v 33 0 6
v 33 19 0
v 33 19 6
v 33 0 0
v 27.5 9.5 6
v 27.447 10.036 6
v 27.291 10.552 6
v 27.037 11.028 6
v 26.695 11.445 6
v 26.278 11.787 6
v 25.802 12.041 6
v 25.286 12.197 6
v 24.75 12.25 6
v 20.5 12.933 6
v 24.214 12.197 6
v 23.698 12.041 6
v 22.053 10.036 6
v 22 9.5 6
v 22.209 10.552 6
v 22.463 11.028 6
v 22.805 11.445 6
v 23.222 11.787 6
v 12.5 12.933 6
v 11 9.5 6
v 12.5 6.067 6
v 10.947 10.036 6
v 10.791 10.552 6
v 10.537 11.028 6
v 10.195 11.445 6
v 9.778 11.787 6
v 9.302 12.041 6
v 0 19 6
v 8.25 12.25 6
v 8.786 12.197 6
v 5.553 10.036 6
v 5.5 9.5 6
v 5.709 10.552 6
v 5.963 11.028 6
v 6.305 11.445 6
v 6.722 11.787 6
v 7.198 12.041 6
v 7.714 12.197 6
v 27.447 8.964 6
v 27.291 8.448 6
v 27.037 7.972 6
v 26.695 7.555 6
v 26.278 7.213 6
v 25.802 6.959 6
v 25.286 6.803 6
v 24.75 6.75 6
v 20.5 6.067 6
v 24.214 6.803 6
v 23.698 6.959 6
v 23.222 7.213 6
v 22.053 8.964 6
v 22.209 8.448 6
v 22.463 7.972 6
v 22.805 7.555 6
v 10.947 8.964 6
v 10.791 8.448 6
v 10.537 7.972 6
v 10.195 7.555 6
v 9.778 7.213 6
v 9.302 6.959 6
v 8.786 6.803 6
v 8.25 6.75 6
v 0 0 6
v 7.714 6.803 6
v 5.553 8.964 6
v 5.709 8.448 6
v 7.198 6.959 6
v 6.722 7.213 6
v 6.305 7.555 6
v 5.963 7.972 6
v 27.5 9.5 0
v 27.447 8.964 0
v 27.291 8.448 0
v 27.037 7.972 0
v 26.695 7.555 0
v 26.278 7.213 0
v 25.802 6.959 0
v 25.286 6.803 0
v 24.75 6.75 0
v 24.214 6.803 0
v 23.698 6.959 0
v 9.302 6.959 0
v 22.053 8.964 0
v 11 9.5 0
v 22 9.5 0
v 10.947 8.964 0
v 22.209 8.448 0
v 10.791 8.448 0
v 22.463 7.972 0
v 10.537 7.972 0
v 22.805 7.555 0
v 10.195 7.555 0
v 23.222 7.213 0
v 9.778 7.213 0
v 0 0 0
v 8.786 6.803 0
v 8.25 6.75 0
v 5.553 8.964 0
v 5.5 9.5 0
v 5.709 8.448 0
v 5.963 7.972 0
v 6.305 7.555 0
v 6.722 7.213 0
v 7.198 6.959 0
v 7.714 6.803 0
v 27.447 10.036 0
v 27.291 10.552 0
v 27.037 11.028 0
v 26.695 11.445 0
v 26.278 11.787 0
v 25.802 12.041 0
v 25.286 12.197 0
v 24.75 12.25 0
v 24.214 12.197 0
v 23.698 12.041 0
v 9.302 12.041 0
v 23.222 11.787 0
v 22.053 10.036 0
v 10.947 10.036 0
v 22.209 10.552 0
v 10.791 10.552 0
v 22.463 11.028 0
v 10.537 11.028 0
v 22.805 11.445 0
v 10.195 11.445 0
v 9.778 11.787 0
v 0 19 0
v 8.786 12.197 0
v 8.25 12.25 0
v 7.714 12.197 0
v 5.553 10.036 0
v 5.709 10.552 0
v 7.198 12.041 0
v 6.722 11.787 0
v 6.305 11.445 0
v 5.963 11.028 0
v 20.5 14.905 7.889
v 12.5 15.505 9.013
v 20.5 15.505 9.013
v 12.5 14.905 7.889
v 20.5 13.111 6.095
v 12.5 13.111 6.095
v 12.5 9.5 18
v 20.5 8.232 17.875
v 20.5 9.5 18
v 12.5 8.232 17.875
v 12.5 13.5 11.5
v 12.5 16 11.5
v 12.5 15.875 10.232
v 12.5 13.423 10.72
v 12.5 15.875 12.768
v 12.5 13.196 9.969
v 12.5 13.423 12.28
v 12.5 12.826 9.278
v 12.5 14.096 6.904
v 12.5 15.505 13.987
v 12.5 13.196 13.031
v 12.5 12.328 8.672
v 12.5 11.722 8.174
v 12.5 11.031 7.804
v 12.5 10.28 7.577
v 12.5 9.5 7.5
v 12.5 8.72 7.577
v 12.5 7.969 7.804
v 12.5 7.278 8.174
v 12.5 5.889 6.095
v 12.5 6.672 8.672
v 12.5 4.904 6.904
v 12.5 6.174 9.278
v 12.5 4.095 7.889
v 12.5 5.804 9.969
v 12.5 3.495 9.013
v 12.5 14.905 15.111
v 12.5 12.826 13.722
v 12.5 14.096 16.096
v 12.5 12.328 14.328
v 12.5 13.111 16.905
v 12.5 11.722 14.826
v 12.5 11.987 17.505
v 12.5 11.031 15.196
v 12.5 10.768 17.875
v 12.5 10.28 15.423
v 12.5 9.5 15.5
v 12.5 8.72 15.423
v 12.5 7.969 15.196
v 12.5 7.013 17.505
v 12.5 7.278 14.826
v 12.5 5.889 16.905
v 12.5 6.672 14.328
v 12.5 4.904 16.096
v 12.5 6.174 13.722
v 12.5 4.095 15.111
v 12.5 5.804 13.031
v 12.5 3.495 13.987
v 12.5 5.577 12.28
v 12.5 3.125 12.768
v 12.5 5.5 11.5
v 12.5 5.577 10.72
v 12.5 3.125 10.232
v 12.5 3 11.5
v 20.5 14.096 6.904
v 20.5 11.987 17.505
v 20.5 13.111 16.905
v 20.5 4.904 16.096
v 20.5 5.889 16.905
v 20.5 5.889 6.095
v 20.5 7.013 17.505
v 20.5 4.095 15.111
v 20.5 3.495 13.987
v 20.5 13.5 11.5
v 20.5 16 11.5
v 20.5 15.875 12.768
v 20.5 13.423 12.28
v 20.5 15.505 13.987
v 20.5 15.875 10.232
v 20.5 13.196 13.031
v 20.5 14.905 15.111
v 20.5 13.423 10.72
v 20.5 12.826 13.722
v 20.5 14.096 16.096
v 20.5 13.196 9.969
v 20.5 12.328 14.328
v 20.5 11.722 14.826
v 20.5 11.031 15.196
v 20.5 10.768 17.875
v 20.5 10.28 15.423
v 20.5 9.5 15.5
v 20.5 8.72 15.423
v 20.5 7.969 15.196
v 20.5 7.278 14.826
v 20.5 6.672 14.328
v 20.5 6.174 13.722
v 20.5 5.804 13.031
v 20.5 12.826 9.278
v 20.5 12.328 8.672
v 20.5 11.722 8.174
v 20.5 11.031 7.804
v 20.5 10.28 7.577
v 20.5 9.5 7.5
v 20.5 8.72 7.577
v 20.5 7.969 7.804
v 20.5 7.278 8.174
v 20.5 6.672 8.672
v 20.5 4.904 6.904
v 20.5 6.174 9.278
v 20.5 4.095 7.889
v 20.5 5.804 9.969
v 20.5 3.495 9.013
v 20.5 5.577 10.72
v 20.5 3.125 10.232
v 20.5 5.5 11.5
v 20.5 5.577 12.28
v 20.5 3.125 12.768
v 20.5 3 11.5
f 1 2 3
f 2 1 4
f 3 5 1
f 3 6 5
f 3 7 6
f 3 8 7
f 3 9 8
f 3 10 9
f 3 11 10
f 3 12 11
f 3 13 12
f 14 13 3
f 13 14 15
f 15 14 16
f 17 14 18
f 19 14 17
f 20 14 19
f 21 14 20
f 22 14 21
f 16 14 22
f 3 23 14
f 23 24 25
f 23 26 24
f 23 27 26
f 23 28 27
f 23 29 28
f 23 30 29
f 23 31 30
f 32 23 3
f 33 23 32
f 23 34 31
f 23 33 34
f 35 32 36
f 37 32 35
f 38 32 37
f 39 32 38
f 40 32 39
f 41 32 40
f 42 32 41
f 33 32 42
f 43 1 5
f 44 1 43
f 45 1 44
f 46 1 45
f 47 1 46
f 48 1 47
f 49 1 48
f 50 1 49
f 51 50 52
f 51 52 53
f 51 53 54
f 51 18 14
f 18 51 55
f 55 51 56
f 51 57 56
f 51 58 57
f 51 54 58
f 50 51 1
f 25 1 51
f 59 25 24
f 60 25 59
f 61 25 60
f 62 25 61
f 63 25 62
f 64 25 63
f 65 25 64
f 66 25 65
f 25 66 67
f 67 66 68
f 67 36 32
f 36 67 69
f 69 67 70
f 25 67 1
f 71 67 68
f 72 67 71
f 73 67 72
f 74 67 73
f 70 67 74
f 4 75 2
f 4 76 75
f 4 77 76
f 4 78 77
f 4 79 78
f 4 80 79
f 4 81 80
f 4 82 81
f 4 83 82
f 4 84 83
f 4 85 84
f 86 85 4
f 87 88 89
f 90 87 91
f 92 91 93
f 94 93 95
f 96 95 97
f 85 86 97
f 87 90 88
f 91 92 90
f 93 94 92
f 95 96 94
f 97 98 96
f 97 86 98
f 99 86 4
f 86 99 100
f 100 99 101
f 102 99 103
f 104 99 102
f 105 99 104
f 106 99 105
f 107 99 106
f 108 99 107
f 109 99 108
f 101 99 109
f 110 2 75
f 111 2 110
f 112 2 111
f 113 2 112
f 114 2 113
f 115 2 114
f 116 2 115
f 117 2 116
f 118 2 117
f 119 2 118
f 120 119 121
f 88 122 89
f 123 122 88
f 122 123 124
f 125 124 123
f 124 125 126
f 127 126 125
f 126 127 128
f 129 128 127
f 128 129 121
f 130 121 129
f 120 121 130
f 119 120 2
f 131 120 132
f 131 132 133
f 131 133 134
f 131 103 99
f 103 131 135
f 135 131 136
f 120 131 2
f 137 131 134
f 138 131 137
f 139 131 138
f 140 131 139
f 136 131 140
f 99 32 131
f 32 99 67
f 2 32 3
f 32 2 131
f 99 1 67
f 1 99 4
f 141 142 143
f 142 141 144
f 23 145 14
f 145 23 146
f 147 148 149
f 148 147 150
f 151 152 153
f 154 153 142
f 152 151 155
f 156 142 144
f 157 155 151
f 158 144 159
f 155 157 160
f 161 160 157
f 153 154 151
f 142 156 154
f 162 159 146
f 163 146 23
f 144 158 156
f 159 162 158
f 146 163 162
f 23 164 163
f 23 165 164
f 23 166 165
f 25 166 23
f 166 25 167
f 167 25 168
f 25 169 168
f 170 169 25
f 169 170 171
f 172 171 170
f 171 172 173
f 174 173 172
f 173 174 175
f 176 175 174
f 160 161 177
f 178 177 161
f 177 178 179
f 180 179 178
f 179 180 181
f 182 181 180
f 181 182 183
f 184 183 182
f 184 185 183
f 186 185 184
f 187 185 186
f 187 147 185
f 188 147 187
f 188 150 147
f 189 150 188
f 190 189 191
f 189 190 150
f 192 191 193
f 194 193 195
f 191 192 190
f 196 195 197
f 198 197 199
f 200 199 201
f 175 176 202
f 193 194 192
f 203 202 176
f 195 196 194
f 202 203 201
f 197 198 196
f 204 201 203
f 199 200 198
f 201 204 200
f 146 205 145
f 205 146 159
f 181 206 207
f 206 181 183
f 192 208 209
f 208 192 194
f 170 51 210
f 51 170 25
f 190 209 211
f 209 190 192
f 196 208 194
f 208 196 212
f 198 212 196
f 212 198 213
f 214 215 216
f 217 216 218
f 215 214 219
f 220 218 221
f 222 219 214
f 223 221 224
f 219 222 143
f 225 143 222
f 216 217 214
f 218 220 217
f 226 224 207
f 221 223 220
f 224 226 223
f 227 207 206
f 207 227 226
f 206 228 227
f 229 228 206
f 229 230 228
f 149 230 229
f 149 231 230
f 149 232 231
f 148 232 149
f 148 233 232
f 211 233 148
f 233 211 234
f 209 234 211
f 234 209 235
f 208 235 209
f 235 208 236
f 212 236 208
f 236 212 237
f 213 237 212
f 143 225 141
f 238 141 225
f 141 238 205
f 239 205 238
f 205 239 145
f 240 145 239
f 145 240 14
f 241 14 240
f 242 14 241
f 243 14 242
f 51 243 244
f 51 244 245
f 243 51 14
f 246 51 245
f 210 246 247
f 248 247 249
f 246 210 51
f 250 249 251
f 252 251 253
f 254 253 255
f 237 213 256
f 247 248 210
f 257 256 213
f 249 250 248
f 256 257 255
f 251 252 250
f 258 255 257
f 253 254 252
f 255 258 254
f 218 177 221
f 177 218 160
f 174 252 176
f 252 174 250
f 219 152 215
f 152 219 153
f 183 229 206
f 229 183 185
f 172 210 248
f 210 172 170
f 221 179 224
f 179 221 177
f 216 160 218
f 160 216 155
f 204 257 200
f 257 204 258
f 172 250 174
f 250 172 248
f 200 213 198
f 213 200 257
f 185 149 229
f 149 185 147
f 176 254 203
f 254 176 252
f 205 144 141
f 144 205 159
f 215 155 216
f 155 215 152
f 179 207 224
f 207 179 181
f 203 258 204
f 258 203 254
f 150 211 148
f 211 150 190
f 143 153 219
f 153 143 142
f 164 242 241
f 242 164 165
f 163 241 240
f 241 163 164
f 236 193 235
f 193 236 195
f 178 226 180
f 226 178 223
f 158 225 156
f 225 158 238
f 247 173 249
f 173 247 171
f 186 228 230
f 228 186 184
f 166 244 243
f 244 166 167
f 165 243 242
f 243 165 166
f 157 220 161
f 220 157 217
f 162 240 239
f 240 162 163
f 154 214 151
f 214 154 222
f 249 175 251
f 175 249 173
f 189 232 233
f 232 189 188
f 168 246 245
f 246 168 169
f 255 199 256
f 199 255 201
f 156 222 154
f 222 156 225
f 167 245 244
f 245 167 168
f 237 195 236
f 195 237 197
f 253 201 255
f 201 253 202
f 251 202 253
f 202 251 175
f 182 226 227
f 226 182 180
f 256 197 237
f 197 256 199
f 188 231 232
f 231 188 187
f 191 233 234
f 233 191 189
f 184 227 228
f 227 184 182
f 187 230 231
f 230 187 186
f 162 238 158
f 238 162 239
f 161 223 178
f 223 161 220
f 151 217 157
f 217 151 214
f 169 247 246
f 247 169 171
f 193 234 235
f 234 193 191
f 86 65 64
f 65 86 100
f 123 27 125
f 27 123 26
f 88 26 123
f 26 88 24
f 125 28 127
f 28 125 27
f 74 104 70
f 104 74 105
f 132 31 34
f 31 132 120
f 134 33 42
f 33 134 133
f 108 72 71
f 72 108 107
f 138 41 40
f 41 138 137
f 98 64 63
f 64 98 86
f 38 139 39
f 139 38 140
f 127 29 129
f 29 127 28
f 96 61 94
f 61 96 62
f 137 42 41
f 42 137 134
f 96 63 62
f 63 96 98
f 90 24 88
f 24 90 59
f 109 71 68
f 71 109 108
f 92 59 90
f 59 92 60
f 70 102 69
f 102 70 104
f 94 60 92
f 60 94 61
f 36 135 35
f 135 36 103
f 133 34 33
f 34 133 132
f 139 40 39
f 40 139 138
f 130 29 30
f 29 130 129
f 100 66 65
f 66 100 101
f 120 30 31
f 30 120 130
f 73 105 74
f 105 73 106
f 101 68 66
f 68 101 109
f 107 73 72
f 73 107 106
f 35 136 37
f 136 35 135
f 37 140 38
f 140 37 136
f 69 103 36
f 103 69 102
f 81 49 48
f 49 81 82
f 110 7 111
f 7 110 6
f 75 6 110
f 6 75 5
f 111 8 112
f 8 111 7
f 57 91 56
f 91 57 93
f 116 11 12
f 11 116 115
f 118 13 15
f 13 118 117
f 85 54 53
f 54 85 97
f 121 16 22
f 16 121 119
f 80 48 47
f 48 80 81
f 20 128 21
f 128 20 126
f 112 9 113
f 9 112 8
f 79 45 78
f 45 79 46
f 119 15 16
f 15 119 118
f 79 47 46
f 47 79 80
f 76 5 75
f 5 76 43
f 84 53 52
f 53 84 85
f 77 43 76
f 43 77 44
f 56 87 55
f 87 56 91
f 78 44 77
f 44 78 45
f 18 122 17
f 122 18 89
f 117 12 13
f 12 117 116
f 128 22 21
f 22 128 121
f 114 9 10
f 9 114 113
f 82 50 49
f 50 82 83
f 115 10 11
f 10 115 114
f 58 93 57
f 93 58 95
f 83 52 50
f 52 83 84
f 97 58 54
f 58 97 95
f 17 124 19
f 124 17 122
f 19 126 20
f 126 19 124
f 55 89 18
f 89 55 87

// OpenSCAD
$fn = 32;

// ----------------------------------------------------------------------
// Cable clip: cable 8 mm, clamp 13 mm, base 33 mm
// ----------------------------------------------------------------------

// --- parameters (mm) ---
plate_x = 33;             // base length, X
plate_y = 19;             // base width, Y
plate_t = 6;              // base thickness
wire_seat_d = 13;         // clamp outside diameter
clip_t = 2.5;             // clamp wall
cable_d = 8;              // cable opening
ring_w = 8;               // clamp width along the cable
screw_d = 5.5;            // screw clearance
sink = 1;                 // overlap of the clamp into the base

module base() {
  cube([plate_x, plate_y, plate_t]);
}

module clamp() {
  translate([plate_x / 2, plate_y / 2, plate_t + wire_seat_d / 2 - sink]) rotate([0, 90, 0])
    cylinder(h = ring_w, d = wire_seat_d, center = true);
}

difference() {
  union() {
    base();
    clamp();
  }
  translate([plate_x / 2, plate_y / 2, plate_t + wire_seat_d / 2 - sink]) rotate([0, 90, 0]) translate([0, 0, -ring_w / 2 - 1]) cylinder(h = ring_w + 2, d = cable_d);
  translate([8.25, plate_y / 2, -1]) cylinder(h = plate_t + 2, d = screw_d);
  translate([24.75, plate_y / 2, -1]) cylinder(h = plate_t + 2, d = screw_d);
}
